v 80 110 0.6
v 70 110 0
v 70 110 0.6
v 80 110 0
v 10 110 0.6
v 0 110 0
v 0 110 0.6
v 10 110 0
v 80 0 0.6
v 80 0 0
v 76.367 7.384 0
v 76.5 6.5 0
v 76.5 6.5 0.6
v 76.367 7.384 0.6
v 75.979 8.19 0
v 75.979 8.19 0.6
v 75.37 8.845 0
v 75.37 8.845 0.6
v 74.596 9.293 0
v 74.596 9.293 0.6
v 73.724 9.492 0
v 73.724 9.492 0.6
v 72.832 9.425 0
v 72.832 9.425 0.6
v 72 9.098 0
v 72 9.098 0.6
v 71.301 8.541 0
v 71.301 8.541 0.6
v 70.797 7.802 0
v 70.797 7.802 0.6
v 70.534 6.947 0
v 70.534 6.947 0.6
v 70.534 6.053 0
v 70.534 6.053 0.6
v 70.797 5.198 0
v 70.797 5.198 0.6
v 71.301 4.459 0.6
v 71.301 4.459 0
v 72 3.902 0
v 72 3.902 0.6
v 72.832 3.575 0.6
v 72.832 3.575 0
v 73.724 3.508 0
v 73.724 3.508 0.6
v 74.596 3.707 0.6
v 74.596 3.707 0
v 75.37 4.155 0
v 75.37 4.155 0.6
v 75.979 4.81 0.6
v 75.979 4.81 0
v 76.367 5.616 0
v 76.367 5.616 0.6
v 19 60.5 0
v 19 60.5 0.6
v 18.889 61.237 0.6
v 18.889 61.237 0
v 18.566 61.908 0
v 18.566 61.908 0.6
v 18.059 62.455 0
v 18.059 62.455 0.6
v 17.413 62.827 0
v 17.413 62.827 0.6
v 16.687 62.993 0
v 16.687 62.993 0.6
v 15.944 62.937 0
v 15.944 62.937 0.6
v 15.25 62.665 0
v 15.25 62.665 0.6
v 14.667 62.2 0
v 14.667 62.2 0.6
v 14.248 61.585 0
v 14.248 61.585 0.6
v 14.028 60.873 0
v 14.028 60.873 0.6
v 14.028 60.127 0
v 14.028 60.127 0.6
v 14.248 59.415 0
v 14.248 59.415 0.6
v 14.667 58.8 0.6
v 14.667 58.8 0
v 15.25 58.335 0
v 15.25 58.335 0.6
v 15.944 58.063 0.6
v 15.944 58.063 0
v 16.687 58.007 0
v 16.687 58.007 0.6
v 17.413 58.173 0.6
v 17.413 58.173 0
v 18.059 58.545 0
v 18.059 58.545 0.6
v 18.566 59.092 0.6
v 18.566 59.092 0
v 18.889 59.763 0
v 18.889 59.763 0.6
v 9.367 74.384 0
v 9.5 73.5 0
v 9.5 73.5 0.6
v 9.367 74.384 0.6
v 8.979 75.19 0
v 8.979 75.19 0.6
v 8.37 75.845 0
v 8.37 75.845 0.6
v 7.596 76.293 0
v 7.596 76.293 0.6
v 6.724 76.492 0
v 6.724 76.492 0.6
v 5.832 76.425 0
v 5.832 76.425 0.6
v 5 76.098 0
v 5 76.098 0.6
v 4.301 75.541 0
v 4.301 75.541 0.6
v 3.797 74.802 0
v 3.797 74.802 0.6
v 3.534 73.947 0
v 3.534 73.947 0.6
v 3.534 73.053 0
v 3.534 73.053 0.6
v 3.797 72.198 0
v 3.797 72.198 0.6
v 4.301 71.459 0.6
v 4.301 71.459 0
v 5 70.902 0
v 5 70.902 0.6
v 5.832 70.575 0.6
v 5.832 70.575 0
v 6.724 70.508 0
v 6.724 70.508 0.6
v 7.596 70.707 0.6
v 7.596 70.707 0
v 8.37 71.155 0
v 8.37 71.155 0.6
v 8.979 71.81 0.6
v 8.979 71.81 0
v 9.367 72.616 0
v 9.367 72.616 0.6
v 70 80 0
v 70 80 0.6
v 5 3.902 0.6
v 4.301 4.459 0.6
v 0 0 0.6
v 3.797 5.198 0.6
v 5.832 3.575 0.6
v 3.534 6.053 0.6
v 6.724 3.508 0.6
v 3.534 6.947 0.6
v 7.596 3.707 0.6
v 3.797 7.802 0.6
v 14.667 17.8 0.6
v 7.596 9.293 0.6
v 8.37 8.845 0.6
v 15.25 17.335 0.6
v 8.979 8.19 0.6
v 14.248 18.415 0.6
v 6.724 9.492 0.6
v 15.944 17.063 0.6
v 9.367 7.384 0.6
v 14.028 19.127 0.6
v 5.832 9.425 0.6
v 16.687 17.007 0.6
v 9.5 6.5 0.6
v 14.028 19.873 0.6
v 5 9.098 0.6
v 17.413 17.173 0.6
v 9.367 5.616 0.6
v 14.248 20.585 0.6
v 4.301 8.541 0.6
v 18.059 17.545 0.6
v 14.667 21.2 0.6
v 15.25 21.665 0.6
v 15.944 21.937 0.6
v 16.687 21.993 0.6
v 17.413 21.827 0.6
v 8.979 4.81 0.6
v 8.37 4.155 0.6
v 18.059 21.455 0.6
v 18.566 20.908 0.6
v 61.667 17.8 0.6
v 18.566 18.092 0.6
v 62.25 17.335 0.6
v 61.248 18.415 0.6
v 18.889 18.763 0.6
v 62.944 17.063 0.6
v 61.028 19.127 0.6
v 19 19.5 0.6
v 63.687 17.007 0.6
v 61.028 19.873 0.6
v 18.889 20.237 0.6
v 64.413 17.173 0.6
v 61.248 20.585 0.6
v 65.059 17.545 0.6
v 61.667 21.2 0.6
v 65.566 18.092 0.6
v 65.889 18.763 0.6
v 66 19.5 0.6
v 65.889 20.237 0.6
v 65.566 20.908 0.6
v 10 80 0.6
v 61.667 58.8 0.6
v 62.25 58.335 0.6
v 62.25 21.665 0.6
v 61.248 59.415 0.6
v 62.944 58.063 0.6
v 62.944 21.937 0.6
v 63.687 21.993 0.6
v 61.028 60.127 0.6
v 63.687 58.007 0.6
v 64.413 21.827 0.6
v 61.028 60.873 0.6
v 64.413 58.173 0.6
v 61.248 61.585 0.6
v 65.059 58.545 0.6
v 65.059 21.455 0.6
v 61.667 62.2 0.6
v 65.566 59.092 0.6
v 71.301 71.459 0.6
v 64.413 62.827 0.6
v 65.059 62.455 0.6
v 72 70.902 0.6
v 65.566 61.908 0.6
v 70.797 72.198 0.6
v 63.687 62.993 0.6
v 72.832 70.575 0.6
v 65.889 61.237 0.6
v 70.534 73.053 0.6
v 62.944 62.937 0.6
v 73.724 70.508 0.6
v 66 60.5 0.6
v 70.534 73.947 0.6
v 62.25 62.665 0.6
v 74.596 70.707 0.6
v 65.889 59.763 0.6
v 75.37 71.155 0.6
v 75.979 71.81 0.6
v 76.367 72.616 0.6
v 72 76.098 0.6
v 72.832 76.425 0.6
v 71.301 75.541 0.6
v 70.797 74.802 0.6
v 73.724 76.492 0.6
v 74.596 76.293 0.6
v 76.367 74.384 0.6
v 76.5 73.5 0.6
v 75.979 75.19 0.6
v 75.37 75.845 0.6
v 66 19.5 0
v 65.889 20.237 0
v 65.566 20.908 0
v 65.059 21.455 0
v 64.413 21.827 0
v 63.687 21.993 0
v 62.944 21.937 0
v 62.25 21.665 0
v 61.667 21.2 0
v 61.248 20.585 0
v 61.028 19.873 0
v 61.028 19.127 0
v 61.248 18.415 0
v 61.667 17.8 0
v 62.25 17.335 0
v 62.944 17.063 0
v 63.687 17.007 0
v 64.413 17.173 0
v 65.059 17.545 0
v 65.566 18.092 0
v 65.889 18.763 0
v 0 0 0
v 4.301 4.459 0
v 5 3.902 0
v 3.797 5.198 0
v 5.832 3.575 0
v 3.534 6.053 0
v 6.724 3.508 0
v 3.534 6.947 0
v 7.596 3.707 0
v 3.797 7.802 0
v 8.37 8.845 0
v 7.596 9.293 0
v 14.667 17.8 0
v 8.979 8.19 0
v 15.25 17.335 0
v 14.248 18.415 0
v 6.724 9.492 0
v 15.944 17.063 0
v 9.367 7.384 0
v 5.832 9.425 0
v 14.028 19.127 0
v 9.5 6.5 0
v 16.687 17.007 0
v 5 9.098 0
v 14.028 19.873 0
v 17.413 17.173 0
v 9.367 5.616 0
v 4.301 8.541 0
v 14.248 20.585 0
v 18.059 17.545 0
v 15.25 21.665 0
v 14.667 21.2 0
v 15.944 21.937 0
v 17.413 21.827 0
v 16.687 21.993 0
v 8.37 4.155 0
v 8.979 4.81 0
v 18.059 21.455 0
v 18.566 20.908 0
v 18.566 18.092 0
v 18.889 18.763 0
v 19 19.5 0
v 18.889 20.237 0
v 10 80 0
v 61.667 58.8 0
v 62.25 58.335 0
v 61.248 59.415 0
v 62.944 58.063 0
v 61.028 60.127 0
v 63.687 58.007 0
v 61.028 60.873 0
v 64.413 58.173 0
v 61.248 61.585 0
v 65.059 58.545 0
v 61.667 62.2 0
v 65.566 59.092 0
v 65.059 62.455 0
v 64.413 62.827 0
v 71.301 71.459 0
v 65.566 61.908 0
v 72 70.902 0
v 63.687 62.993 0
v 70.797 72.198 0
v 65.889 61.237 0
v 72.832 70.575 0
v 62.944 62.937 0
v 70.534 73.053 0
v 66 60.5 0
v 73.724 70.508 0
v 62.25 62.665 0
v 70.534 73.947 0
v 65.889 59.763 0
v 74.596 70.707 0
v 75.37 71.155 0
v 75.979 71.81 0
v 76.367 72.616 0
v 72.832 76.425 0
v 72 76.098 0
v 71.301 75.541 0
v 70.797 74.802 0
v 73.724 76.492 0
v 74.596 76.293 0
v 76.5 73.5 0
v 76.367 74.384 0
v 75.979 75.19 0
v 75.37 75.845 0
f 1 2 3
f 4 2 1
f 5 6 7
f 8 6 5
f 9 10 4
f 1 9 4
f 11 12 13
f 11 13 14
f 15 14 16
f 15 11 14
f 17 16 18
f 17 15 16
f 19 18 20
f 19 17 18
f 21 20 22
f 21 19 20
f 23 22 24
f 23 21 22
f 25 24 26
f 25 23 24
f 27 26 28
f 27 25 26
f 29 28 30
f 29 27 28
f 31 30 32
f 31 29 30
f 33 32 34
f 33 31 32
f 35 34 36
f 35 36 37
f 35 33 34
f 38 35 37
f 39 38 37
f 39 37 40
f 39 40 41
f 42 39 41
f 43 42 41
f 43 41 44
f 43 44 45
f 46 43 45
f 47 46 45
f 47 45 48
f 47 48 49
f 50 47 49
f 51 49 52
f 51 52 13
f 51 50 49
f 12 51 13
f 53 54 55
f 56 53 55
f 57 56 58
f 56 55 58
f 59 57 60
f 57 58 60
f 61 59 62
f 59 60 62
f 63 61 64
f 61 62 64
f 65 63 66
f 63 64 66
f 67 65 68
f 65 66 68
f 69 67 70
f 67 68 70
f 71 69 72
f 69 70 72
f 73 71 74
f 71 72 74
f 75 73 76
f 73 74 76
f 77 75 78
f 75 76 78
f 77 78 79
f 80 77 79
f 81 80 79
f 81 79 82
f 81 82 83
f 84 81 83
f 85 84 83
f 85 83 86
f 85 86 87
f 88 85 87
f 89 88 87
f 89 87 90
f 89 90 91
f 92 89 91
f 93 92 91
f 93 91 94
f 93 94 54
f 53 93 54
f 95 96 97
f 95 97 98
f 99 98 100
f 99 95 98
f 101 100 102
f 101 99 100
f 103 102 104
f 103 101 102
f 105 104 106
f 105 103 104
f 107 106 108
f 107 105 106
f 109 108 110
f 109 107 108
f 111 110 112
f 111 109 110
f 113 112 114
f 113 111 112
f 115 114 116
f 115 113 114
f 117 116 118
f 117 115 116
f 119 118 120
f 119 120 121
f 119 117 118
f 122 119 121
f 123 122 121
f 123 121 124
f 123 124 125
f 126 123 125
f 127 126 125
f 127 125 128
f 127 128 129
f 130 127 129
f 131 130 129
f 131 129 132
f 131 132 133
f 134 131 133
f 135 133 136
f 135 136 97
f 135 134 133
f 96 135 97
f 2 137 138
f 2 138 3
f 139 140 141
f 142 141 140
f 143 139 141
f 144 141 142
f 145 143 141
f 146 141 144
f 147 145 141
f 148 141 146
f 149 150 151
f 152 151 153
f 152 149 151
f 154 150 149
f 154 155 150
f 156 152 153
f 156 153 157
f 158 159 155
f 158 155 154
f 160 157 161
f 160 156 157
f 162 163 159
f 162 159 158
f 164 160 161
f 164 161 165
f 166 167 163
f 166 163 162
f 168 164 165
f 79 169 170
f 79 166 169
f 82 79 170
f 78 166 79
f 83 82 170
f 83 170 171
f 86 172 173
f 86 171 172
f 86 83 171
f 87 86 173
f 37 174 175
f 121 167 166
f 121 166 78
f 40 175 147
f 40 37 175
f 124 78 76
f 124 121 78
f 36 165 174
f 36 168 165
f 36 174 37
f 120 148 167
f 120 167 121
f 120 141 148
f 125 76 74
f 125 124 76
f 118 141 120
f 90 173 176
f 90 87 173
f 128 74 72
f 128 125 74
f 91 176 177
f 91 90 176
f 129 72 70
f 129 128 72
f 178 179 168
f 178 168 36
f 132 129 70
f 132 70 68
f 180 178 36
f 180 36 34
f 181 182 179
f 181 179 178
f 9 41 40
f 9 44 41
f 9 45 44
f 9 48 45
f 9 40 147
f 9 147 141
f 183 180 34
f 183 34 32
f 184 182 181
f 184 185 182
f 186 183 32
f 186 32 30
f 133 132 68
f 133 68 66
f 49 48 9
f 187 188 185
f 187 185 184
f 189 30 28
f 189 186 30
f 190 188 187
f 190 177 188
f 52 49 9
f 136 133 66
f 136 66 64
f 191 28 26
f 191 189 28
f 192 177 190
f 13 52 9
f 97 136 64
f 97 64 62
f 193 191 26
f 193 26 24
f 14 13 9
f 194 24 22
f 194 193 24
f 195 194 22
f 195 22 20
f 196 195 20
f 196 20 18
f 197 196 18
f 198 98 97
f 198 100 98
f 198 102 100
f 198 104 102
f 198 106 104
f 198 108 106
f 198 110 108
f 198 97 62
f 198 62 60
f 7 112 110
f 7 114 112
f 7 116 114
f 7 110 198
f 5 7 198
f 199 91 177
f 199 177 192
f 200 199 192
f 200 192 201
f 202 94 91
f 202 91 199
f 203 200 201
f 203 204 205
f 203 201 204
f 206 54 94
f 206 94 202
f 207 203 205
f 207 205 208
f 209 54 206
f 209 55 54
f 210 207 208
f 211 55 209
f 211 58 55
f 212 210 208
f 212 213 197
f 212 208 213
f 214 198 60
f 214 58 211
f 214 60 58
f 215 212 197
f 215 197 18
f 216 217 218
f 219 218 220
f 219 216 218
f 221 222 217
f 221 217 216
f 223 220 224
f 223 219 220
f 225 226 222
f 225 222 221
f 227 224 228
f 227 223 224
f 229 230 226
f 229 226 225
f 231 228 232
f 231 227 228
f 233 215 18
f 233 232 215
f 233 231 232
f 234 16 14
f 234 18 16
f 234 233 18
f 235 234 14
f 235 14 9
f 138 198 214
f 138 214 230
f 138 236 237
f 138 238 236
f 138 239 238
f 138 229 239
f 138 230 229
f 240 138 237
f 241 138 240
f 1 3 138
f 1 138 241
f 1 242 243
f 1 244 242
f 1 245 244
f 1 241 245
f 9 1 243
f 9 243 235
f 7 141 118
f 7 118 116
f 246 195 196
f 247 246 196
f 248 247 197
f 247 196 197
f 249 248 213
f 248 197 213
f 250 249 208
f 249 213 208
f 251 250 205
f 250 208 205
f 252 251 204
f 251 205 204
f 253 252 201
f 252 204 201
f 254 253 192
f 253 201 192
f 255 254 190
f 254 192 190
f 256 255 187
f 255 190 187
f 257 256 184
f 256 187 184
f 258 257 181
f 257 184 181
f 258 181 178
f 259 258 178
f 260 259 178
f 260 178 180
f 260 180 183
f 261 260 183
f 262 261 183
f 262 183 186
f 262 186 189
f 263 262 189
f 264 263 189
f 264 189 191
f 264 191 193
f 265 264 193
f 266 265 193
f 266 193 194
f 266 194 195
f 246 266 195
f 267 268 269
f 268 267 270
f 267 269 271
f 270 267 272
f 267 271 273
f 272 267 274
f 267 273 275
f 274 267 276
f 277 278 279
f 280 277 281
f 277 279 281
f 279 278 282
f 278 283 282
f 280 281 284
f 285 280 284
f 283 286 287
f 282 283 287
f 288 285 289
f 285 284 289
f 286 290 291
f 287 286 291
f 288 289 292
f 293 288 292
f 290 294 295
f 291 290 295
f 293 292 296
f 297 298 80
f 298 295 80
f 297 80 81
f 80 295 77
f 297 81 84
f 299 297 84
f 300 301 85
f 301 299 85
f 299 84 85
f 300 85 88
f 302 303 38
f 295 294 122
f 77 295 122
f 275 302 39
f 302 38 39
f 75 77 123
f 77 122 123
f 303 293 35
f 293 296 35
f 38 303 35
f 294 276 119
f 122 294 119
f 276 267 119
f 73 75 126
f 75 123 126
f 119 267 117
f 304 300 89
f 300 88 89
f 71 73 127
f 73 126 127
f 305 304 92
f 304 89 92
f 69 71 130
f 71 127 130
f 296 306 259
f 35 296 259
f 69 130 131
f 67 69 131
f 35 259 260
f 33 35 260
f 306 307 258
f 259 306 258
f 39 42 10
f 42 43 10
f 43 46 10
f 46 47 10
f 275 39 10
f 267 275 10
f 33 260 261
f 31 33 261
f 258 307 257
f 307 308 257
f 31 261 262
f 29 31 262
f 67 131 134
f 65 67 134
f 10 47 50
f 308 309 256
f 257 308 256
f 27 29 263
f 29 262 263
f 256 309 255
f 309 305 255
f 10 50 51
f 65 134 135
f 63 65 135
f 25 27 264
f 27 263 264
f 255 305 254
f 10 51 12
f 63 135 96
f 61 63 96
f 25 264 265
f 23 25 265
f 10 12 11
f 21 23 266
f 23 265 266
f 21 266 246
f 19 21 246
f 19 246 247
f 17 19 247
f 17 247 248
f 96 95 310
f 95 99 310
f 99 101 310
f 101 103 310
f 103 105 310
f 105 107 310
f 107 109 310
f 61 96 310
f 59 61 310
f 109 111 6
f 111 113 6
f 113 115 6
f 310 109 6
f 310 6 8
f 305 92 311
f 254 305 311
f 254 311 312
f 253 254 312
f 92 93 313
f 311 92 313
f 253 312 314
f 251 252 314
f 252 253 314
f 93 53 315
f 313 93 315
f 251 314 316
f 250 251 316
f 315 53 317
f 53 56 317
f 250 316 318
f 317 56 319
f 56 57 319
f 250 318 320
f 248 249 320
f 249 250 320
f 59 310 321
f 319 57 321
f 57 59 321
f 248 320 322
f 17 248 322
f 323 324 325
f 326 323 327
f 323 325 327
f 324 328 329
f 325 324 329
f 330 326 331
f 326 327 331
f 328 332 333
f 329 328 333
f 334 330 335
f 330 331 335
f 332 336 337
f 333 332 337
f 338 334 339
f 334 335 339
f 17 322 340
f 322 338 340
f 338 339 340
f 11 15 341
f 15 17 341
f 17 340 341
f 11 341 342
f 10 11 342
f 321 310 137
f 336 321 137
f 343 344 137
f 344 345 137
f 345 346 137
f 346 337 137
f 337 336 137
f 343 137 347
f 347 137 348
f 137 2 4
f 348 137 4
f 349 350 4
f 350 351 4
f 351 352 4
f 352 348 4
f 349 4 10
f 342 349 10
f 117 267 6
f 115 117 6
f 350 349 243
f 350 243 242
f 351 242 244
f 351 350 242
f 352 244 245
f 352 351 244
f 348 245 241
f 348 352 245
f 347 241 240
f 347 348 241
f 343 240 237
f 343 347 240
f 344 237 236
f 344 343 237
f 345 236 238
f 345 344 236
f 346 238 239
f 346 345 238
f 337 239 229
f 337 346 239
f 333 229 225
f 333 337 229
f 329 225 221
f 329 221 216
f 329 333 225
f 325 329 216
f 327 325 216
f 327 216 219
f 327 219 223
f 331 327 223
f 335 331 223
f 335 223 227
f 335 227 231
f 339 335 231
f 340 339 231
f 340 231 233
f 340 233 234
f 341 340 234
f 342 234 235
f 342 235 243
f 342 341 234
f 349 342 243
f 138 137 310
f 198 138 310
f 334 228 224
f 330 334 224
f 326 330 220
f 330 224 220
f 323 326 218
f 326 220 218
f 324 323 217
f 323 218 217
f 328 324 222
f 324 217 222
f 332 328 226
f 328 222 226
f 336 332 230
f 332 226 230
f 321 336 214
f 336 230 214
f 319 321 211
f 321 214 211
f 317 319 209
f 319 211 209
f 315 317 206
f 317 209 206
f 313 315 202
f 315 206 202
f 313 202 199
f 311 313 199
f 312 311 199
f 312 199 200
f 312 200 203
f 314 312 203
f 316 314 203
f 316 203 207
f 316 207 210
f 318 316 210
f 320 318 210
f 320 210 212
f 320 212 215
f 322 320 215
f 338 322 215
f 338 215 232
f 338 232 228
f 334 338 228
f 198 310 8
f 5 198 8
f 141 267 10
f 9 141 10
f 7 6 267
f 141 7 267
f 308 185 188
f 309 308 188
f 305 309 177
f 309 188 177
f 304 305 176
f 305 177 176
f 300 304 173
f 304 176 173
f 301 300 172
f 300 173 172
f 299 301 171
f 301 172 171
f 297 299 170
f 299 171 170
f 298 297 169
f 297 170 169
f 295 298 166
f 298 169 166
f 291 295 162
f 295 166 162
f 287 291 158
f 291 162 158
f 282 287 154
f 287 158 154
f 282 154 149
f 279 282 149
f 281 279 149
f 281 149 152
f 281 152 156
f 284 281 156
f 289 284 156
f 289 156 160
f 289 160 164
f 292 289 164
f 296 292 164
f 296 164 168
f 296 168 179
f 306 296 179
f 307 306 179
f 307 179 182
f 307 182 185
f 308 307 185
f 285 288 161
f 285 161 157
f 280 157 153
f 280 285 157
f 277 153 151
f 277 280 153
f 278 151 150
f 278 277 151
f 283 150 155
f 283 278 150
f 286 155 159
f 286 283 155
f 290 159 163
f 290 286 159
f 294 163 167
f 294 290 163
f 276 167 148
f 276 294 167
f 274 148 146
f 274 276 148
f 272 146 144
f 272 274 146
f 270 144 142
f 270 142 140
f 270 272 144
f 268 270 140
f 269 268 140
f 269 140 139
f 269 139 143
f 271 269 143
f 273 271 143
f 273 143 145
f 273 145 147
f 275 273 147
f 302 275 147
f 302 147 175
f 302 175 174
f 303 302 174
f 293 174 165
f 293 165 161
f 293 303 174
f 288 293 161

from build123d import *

# Parameters (mm, degrees)
F0_R     = 3
F0_W     = 10
F0_H     = 30
F1_DEPTH = 0.6
F2_R     = 2.5
F3_DEPTH = 0.601


with BuildPart() as f1:
    # F0 (on Top) → F1 (new body)
    with BuildSketch(Plane.XY):
        Polygon((0, 80), (0, 0), (80, 0), (80, 80), (70, 80), (10, 80), align=None)
        with Locations((6.5, 6.5)):
            Circle(F0_R, mode=Mode.SUBTRACT)
        with Locations((73.5, 6.5)):
            Circle(F0_R, mode=Mode.SUBTRACT)
        with Locations((6.5, 73.5)):
            Circle(F0_R, mode=Mode.SUBTRACT)
        with Locations((73.5, 73.5)):
            Circle(F0_R, mode=Mode.SUBTRACT)
        with Locations((5, 95)):
            Rectangle(F0_W, F0_H)
        with Locations((75, 95)):
            Rectangle(F0_W, F0_H)
    extrude(amount=F1_DEPTH)

    # F2 (on face) → F3 (cut, through all)
    with BuildSketch(Plane.XY.offset(0.6)):
        with Locations((16.5, 60.5)):
            Circle(F2_R)
        with Locations((63.5, 60.5)):
            Circle(F2_R)
        with Locations((63.5, 19.5)):
            Circle(F2_R)
        with Locations((16.5, 19.5)):
            Circle(F2_R)
    extrude(amount=-F3_DEPTH, mode=Mode.SUBTRACT)


solid = f1.part
